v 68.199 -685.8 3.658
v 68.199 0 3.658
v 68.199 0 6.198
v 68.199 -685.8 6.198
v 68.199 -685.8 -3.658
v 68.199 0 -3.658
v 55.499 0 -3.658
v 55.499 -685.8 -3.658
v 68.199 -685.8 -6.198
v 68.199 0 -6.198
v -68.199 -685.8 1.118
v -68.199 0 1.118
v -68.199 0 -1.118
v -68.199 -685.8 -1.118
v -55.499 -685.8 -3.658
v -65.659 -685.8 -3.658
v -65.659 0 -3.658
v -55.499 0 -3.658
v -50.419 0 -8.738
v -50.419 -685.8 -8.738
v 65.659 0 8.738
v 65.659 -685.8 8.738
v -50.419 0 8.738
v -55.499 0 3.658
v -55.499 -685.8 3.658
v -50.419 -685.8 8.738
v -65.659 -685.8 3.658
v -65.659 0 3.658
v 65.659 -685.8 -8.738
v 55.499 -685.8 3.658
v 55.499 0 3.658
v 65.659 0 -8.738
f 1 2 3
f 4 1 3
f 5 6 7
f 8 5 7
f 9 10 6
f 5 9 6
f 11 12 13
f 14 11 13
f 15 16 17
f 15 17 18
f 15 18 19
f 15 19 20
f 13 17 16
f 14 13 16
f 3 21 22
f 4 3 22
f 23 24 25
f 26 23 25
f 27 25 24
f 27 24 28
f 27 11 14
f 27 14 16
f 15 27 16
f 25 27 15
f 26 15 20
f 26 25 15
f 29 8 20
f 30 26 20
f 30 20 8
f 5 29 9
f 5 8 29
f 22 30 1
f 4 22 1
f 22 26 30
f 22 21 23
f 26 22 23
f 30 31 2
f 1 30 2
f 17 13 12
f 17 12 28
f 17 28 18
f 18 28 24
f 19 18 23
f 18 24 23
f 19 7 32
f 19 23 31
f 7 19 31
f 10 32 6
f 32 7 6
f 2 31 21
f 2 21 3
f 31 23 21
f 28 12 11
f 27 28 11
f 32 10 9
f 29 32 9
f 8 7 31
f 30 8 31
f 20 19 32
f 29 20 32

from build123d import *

# Parameters (mm, degrees)
F1_DEPTH = 685.8
F2_SIZE  = 2.54
F3_SIZE  = 5.07999


# Not quite as in the source:
# - a fillet or chamfer is up to 0.001 mm smaller than in the source, because OpenCascade refuses the exact size


with BuildPart() as f1:
    # F0 (on Front) → F1 (new body)
    with BuildSketch(Plane.XZ):
        Polygon((68.199, 3.6576), (68.199, 8.7376), (-55.499, 8.7376), (-55.499, 3.6576), (-68.199, 3.6576), (-68.199, -3.6576), (-55.499, -3.6576), (-55.499, -8.7376), (68.199, -8.7376), (68.199, -3.6576), (55.499, -3.6576), (55.499, 3.6576), align=None)
    extrude(amount=F1_DEPTH)

    # F2
    f2_edges = [f1.edges().sort_by_distance(p)[0] for p in [
        (68.199, -342.9, 8.7376),
        (68.199, -342.9, -8.7376),
        (-68.199, -342.9, 3.6576),
        (-68.199, -342.9, -3.6576),
    ]]
    chamfer(f2_edges, length=F2_SIZE)

    # F3 (size 5.08 in the source; OpenCascade refuses exactly that, so slightly less here)
    f3_edges = [f1.edges().sort_by_distance(p)[0] for p in [
        (-55.499, -342.9, 8.7376),
        (-55.499, -342.9, -8.7376),
    ]]
    chamfer(f3_edges, length=F3_SIZE)


solid = f1.part
